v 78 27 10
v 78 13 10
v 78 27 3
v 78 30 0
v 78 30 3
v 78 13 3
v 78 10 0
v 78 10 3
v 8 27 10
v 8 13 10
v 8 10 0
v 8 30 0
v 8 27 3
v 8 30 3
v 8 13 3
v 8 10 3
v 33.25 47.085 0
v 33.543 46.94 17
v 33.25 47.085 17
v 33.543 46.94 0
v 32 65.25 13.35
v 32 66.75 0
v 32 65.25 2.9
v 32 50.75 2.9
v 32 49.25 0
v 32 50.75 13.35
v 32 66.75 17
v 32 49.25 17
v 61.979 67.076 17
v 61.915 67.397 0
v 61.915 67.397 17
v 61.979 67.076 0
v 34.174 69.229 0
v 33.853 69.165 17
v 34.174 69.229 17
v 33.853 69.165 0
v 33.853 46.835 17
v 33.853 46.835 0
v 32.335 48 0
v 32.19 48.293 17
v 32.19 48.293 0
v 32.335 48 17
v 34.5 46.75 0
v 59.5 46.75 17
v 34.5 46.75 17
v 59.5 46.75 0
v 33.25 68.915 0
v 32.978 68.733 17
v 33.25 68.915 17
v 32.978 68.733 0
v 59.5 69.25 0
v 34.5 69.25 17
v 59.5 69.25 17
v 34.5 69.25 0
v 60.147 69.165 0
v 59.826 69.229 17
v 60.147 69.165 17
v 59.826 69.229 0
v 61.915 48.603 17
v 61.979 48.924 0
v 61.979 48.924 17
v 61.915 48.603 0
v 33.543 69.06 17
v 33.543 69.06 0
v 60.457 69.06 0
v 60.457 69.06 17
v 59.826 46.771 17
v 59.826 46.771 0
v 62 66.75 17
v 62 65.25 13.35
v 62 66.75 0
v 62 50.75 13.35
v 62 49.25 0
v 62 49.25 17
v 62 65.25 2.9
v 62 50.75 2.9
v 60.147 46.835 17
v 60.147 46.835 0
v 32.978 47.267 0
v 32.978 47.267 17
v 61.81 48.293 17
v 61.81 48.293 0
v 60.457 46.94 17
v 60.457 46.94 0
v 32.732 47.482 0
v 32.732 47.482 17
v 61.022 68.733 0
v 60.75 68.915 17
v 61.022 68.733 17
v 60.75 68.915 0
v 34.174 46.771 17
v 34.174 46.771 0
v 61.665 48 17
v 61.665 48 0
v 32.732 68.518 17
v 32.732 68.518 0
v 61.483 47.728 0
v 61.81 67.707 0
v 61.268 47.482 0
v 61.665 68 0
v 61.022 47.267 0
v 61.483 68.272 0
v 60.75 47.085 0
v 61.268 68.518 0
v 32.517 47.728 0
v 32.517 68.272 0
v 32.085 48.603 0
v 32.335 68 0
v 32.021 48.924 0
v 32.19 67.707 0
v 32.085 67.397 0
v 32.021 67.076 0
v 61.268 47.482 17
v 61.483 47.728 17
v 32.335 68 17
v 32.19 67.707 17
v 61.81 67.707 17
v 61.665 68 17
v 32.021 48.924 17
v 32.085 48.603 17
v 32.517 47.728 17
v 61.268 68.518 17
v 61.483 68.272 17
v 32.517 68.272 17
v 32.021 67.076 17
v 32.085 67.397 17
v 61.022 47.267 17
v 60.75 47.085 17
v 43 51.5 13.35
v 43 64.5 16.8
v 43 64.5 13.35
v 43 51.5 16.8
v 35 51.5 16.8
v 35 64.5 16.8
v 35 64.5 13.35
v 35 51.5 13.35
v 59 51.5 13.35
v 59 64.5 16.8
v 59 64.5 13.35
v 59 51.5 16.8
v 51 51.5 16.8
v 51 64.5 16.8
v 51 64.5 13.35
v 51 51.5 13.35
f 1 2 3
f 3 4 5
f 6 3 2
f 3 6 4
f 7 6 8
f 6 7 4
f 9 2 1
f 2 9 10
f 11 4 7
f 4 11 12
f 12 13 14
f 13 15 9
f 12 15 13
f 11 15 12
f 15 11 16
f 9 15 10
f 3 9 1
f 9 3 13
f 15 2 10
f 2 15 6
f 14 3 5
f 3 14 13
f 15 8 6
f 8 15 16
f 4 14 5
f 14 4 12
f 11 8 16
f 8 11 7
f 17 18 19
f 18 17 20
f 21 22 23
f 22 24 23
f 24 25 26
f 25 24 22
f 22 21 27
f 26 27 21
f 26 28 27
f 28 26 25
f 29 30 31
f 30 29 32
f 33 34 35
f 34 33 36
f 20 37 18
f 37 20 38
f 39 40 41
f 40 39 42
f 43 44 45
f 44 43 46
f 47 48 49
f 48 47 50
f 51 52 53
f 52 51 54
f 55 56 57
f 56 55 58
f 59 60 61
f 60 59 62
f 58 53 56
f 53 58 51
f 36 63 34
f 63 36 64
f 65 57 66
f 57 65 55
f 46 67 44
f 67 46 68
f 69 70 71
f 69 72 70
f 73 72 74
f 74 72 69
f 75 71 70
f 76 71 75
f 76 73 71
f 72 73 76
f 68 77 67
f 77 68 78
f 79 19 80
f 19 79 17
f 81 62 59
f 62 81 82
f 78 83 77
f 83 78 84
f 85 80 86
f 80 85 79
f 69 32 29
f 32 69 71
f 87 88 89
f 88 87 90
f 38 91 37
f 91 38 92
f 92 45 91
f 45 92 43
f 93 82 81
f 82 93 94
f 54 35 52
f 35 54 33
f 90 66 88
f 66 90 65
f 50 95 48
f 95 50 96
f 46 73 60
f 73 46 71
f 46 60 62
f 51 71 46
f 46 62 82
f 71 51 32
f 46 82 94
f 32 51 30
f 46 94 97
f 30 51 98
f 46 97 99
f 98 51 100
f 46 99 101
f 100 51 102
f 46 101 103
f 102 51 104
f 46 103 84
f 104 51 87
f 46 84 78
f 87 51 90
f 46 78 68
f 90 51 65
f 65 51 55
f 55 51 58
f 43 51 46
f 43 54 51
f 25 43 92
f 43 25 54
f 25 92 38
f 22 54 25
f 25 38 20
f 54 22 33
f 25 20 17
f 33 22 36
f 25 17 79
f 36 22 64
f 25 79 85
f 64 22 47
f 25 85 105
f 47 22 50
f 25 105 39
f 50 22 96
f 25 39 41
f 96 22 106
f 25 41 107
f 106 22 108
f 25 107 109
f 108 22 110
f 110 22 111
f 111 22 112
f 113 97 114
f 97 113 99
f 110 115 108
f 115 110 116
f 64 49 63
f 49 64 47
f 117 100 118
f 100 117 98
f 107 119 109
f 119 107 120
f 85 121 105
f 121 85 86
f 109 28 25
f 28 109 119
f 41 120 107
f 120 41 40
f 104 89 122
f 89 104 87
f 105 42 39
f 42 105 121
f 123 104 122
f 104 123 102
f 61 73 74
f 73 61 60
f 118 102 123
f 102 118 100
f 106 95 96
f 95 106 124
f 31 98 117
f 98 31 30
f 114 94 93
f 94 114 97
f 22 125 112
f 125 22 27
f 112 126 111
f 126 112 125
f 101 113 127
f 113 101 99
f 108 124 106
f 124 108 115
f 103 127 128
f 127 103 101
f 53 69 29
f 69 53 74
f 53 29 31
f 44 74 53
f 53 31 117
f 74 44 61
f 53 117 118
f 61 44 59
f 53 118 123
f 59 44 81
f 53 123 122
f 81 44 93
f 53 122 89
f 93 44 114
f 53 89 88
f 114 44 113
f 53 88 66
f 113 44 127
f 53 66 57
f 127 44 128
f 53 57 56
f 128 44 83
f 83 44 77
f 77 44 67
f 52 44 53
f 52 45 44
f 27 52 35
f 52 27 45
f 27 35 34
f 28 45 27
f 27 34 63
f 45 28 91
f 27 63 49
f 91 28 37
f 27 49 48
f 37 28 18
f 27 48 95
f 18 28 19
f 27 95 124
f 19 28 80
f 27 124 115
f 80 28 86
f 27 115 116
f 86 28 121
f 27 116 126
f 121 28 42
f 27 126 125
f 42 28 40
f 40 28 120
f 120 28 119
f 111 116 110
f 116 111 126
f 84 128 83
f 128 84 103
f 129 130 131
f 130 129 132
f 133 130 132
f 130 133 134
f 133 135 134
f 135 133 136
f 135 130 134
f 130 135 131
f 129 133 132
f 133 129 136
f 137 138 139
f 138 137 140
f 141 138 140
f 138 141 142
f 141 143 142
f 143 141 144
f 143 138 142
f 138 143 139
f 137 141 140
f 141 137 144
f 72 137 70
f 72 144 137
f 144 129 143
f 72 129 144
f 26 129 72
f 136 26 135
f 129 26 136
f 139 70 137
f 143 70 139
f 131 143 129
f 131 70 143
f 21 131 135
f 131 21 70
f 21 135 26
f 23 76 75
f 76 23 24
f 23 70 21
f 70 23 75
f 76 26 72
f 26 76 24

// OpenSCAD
/*
Sample 093: Vorgespannter Feder-Schlitten — weich
Generated from the FDM Mechanical Sample Library.
Units: millimetres.

Override examples:
  openscad -o custom.stl -D 'view="plate"' -D 'render_fn=64' model.scad
  openscad -o preview.png -D 'view="assembly"' model.scad
*/
use <../../../library/fdm_mechanisms.scad>

render_fn = is_undef(render_fn) ? 48 : render_fn;
view = is_undef(view) ? "plate" : view;
$fn = render_fn;

sample_preload_slider(
    view=view,
    clearance=0.25,
    beam_t=0.8
);
